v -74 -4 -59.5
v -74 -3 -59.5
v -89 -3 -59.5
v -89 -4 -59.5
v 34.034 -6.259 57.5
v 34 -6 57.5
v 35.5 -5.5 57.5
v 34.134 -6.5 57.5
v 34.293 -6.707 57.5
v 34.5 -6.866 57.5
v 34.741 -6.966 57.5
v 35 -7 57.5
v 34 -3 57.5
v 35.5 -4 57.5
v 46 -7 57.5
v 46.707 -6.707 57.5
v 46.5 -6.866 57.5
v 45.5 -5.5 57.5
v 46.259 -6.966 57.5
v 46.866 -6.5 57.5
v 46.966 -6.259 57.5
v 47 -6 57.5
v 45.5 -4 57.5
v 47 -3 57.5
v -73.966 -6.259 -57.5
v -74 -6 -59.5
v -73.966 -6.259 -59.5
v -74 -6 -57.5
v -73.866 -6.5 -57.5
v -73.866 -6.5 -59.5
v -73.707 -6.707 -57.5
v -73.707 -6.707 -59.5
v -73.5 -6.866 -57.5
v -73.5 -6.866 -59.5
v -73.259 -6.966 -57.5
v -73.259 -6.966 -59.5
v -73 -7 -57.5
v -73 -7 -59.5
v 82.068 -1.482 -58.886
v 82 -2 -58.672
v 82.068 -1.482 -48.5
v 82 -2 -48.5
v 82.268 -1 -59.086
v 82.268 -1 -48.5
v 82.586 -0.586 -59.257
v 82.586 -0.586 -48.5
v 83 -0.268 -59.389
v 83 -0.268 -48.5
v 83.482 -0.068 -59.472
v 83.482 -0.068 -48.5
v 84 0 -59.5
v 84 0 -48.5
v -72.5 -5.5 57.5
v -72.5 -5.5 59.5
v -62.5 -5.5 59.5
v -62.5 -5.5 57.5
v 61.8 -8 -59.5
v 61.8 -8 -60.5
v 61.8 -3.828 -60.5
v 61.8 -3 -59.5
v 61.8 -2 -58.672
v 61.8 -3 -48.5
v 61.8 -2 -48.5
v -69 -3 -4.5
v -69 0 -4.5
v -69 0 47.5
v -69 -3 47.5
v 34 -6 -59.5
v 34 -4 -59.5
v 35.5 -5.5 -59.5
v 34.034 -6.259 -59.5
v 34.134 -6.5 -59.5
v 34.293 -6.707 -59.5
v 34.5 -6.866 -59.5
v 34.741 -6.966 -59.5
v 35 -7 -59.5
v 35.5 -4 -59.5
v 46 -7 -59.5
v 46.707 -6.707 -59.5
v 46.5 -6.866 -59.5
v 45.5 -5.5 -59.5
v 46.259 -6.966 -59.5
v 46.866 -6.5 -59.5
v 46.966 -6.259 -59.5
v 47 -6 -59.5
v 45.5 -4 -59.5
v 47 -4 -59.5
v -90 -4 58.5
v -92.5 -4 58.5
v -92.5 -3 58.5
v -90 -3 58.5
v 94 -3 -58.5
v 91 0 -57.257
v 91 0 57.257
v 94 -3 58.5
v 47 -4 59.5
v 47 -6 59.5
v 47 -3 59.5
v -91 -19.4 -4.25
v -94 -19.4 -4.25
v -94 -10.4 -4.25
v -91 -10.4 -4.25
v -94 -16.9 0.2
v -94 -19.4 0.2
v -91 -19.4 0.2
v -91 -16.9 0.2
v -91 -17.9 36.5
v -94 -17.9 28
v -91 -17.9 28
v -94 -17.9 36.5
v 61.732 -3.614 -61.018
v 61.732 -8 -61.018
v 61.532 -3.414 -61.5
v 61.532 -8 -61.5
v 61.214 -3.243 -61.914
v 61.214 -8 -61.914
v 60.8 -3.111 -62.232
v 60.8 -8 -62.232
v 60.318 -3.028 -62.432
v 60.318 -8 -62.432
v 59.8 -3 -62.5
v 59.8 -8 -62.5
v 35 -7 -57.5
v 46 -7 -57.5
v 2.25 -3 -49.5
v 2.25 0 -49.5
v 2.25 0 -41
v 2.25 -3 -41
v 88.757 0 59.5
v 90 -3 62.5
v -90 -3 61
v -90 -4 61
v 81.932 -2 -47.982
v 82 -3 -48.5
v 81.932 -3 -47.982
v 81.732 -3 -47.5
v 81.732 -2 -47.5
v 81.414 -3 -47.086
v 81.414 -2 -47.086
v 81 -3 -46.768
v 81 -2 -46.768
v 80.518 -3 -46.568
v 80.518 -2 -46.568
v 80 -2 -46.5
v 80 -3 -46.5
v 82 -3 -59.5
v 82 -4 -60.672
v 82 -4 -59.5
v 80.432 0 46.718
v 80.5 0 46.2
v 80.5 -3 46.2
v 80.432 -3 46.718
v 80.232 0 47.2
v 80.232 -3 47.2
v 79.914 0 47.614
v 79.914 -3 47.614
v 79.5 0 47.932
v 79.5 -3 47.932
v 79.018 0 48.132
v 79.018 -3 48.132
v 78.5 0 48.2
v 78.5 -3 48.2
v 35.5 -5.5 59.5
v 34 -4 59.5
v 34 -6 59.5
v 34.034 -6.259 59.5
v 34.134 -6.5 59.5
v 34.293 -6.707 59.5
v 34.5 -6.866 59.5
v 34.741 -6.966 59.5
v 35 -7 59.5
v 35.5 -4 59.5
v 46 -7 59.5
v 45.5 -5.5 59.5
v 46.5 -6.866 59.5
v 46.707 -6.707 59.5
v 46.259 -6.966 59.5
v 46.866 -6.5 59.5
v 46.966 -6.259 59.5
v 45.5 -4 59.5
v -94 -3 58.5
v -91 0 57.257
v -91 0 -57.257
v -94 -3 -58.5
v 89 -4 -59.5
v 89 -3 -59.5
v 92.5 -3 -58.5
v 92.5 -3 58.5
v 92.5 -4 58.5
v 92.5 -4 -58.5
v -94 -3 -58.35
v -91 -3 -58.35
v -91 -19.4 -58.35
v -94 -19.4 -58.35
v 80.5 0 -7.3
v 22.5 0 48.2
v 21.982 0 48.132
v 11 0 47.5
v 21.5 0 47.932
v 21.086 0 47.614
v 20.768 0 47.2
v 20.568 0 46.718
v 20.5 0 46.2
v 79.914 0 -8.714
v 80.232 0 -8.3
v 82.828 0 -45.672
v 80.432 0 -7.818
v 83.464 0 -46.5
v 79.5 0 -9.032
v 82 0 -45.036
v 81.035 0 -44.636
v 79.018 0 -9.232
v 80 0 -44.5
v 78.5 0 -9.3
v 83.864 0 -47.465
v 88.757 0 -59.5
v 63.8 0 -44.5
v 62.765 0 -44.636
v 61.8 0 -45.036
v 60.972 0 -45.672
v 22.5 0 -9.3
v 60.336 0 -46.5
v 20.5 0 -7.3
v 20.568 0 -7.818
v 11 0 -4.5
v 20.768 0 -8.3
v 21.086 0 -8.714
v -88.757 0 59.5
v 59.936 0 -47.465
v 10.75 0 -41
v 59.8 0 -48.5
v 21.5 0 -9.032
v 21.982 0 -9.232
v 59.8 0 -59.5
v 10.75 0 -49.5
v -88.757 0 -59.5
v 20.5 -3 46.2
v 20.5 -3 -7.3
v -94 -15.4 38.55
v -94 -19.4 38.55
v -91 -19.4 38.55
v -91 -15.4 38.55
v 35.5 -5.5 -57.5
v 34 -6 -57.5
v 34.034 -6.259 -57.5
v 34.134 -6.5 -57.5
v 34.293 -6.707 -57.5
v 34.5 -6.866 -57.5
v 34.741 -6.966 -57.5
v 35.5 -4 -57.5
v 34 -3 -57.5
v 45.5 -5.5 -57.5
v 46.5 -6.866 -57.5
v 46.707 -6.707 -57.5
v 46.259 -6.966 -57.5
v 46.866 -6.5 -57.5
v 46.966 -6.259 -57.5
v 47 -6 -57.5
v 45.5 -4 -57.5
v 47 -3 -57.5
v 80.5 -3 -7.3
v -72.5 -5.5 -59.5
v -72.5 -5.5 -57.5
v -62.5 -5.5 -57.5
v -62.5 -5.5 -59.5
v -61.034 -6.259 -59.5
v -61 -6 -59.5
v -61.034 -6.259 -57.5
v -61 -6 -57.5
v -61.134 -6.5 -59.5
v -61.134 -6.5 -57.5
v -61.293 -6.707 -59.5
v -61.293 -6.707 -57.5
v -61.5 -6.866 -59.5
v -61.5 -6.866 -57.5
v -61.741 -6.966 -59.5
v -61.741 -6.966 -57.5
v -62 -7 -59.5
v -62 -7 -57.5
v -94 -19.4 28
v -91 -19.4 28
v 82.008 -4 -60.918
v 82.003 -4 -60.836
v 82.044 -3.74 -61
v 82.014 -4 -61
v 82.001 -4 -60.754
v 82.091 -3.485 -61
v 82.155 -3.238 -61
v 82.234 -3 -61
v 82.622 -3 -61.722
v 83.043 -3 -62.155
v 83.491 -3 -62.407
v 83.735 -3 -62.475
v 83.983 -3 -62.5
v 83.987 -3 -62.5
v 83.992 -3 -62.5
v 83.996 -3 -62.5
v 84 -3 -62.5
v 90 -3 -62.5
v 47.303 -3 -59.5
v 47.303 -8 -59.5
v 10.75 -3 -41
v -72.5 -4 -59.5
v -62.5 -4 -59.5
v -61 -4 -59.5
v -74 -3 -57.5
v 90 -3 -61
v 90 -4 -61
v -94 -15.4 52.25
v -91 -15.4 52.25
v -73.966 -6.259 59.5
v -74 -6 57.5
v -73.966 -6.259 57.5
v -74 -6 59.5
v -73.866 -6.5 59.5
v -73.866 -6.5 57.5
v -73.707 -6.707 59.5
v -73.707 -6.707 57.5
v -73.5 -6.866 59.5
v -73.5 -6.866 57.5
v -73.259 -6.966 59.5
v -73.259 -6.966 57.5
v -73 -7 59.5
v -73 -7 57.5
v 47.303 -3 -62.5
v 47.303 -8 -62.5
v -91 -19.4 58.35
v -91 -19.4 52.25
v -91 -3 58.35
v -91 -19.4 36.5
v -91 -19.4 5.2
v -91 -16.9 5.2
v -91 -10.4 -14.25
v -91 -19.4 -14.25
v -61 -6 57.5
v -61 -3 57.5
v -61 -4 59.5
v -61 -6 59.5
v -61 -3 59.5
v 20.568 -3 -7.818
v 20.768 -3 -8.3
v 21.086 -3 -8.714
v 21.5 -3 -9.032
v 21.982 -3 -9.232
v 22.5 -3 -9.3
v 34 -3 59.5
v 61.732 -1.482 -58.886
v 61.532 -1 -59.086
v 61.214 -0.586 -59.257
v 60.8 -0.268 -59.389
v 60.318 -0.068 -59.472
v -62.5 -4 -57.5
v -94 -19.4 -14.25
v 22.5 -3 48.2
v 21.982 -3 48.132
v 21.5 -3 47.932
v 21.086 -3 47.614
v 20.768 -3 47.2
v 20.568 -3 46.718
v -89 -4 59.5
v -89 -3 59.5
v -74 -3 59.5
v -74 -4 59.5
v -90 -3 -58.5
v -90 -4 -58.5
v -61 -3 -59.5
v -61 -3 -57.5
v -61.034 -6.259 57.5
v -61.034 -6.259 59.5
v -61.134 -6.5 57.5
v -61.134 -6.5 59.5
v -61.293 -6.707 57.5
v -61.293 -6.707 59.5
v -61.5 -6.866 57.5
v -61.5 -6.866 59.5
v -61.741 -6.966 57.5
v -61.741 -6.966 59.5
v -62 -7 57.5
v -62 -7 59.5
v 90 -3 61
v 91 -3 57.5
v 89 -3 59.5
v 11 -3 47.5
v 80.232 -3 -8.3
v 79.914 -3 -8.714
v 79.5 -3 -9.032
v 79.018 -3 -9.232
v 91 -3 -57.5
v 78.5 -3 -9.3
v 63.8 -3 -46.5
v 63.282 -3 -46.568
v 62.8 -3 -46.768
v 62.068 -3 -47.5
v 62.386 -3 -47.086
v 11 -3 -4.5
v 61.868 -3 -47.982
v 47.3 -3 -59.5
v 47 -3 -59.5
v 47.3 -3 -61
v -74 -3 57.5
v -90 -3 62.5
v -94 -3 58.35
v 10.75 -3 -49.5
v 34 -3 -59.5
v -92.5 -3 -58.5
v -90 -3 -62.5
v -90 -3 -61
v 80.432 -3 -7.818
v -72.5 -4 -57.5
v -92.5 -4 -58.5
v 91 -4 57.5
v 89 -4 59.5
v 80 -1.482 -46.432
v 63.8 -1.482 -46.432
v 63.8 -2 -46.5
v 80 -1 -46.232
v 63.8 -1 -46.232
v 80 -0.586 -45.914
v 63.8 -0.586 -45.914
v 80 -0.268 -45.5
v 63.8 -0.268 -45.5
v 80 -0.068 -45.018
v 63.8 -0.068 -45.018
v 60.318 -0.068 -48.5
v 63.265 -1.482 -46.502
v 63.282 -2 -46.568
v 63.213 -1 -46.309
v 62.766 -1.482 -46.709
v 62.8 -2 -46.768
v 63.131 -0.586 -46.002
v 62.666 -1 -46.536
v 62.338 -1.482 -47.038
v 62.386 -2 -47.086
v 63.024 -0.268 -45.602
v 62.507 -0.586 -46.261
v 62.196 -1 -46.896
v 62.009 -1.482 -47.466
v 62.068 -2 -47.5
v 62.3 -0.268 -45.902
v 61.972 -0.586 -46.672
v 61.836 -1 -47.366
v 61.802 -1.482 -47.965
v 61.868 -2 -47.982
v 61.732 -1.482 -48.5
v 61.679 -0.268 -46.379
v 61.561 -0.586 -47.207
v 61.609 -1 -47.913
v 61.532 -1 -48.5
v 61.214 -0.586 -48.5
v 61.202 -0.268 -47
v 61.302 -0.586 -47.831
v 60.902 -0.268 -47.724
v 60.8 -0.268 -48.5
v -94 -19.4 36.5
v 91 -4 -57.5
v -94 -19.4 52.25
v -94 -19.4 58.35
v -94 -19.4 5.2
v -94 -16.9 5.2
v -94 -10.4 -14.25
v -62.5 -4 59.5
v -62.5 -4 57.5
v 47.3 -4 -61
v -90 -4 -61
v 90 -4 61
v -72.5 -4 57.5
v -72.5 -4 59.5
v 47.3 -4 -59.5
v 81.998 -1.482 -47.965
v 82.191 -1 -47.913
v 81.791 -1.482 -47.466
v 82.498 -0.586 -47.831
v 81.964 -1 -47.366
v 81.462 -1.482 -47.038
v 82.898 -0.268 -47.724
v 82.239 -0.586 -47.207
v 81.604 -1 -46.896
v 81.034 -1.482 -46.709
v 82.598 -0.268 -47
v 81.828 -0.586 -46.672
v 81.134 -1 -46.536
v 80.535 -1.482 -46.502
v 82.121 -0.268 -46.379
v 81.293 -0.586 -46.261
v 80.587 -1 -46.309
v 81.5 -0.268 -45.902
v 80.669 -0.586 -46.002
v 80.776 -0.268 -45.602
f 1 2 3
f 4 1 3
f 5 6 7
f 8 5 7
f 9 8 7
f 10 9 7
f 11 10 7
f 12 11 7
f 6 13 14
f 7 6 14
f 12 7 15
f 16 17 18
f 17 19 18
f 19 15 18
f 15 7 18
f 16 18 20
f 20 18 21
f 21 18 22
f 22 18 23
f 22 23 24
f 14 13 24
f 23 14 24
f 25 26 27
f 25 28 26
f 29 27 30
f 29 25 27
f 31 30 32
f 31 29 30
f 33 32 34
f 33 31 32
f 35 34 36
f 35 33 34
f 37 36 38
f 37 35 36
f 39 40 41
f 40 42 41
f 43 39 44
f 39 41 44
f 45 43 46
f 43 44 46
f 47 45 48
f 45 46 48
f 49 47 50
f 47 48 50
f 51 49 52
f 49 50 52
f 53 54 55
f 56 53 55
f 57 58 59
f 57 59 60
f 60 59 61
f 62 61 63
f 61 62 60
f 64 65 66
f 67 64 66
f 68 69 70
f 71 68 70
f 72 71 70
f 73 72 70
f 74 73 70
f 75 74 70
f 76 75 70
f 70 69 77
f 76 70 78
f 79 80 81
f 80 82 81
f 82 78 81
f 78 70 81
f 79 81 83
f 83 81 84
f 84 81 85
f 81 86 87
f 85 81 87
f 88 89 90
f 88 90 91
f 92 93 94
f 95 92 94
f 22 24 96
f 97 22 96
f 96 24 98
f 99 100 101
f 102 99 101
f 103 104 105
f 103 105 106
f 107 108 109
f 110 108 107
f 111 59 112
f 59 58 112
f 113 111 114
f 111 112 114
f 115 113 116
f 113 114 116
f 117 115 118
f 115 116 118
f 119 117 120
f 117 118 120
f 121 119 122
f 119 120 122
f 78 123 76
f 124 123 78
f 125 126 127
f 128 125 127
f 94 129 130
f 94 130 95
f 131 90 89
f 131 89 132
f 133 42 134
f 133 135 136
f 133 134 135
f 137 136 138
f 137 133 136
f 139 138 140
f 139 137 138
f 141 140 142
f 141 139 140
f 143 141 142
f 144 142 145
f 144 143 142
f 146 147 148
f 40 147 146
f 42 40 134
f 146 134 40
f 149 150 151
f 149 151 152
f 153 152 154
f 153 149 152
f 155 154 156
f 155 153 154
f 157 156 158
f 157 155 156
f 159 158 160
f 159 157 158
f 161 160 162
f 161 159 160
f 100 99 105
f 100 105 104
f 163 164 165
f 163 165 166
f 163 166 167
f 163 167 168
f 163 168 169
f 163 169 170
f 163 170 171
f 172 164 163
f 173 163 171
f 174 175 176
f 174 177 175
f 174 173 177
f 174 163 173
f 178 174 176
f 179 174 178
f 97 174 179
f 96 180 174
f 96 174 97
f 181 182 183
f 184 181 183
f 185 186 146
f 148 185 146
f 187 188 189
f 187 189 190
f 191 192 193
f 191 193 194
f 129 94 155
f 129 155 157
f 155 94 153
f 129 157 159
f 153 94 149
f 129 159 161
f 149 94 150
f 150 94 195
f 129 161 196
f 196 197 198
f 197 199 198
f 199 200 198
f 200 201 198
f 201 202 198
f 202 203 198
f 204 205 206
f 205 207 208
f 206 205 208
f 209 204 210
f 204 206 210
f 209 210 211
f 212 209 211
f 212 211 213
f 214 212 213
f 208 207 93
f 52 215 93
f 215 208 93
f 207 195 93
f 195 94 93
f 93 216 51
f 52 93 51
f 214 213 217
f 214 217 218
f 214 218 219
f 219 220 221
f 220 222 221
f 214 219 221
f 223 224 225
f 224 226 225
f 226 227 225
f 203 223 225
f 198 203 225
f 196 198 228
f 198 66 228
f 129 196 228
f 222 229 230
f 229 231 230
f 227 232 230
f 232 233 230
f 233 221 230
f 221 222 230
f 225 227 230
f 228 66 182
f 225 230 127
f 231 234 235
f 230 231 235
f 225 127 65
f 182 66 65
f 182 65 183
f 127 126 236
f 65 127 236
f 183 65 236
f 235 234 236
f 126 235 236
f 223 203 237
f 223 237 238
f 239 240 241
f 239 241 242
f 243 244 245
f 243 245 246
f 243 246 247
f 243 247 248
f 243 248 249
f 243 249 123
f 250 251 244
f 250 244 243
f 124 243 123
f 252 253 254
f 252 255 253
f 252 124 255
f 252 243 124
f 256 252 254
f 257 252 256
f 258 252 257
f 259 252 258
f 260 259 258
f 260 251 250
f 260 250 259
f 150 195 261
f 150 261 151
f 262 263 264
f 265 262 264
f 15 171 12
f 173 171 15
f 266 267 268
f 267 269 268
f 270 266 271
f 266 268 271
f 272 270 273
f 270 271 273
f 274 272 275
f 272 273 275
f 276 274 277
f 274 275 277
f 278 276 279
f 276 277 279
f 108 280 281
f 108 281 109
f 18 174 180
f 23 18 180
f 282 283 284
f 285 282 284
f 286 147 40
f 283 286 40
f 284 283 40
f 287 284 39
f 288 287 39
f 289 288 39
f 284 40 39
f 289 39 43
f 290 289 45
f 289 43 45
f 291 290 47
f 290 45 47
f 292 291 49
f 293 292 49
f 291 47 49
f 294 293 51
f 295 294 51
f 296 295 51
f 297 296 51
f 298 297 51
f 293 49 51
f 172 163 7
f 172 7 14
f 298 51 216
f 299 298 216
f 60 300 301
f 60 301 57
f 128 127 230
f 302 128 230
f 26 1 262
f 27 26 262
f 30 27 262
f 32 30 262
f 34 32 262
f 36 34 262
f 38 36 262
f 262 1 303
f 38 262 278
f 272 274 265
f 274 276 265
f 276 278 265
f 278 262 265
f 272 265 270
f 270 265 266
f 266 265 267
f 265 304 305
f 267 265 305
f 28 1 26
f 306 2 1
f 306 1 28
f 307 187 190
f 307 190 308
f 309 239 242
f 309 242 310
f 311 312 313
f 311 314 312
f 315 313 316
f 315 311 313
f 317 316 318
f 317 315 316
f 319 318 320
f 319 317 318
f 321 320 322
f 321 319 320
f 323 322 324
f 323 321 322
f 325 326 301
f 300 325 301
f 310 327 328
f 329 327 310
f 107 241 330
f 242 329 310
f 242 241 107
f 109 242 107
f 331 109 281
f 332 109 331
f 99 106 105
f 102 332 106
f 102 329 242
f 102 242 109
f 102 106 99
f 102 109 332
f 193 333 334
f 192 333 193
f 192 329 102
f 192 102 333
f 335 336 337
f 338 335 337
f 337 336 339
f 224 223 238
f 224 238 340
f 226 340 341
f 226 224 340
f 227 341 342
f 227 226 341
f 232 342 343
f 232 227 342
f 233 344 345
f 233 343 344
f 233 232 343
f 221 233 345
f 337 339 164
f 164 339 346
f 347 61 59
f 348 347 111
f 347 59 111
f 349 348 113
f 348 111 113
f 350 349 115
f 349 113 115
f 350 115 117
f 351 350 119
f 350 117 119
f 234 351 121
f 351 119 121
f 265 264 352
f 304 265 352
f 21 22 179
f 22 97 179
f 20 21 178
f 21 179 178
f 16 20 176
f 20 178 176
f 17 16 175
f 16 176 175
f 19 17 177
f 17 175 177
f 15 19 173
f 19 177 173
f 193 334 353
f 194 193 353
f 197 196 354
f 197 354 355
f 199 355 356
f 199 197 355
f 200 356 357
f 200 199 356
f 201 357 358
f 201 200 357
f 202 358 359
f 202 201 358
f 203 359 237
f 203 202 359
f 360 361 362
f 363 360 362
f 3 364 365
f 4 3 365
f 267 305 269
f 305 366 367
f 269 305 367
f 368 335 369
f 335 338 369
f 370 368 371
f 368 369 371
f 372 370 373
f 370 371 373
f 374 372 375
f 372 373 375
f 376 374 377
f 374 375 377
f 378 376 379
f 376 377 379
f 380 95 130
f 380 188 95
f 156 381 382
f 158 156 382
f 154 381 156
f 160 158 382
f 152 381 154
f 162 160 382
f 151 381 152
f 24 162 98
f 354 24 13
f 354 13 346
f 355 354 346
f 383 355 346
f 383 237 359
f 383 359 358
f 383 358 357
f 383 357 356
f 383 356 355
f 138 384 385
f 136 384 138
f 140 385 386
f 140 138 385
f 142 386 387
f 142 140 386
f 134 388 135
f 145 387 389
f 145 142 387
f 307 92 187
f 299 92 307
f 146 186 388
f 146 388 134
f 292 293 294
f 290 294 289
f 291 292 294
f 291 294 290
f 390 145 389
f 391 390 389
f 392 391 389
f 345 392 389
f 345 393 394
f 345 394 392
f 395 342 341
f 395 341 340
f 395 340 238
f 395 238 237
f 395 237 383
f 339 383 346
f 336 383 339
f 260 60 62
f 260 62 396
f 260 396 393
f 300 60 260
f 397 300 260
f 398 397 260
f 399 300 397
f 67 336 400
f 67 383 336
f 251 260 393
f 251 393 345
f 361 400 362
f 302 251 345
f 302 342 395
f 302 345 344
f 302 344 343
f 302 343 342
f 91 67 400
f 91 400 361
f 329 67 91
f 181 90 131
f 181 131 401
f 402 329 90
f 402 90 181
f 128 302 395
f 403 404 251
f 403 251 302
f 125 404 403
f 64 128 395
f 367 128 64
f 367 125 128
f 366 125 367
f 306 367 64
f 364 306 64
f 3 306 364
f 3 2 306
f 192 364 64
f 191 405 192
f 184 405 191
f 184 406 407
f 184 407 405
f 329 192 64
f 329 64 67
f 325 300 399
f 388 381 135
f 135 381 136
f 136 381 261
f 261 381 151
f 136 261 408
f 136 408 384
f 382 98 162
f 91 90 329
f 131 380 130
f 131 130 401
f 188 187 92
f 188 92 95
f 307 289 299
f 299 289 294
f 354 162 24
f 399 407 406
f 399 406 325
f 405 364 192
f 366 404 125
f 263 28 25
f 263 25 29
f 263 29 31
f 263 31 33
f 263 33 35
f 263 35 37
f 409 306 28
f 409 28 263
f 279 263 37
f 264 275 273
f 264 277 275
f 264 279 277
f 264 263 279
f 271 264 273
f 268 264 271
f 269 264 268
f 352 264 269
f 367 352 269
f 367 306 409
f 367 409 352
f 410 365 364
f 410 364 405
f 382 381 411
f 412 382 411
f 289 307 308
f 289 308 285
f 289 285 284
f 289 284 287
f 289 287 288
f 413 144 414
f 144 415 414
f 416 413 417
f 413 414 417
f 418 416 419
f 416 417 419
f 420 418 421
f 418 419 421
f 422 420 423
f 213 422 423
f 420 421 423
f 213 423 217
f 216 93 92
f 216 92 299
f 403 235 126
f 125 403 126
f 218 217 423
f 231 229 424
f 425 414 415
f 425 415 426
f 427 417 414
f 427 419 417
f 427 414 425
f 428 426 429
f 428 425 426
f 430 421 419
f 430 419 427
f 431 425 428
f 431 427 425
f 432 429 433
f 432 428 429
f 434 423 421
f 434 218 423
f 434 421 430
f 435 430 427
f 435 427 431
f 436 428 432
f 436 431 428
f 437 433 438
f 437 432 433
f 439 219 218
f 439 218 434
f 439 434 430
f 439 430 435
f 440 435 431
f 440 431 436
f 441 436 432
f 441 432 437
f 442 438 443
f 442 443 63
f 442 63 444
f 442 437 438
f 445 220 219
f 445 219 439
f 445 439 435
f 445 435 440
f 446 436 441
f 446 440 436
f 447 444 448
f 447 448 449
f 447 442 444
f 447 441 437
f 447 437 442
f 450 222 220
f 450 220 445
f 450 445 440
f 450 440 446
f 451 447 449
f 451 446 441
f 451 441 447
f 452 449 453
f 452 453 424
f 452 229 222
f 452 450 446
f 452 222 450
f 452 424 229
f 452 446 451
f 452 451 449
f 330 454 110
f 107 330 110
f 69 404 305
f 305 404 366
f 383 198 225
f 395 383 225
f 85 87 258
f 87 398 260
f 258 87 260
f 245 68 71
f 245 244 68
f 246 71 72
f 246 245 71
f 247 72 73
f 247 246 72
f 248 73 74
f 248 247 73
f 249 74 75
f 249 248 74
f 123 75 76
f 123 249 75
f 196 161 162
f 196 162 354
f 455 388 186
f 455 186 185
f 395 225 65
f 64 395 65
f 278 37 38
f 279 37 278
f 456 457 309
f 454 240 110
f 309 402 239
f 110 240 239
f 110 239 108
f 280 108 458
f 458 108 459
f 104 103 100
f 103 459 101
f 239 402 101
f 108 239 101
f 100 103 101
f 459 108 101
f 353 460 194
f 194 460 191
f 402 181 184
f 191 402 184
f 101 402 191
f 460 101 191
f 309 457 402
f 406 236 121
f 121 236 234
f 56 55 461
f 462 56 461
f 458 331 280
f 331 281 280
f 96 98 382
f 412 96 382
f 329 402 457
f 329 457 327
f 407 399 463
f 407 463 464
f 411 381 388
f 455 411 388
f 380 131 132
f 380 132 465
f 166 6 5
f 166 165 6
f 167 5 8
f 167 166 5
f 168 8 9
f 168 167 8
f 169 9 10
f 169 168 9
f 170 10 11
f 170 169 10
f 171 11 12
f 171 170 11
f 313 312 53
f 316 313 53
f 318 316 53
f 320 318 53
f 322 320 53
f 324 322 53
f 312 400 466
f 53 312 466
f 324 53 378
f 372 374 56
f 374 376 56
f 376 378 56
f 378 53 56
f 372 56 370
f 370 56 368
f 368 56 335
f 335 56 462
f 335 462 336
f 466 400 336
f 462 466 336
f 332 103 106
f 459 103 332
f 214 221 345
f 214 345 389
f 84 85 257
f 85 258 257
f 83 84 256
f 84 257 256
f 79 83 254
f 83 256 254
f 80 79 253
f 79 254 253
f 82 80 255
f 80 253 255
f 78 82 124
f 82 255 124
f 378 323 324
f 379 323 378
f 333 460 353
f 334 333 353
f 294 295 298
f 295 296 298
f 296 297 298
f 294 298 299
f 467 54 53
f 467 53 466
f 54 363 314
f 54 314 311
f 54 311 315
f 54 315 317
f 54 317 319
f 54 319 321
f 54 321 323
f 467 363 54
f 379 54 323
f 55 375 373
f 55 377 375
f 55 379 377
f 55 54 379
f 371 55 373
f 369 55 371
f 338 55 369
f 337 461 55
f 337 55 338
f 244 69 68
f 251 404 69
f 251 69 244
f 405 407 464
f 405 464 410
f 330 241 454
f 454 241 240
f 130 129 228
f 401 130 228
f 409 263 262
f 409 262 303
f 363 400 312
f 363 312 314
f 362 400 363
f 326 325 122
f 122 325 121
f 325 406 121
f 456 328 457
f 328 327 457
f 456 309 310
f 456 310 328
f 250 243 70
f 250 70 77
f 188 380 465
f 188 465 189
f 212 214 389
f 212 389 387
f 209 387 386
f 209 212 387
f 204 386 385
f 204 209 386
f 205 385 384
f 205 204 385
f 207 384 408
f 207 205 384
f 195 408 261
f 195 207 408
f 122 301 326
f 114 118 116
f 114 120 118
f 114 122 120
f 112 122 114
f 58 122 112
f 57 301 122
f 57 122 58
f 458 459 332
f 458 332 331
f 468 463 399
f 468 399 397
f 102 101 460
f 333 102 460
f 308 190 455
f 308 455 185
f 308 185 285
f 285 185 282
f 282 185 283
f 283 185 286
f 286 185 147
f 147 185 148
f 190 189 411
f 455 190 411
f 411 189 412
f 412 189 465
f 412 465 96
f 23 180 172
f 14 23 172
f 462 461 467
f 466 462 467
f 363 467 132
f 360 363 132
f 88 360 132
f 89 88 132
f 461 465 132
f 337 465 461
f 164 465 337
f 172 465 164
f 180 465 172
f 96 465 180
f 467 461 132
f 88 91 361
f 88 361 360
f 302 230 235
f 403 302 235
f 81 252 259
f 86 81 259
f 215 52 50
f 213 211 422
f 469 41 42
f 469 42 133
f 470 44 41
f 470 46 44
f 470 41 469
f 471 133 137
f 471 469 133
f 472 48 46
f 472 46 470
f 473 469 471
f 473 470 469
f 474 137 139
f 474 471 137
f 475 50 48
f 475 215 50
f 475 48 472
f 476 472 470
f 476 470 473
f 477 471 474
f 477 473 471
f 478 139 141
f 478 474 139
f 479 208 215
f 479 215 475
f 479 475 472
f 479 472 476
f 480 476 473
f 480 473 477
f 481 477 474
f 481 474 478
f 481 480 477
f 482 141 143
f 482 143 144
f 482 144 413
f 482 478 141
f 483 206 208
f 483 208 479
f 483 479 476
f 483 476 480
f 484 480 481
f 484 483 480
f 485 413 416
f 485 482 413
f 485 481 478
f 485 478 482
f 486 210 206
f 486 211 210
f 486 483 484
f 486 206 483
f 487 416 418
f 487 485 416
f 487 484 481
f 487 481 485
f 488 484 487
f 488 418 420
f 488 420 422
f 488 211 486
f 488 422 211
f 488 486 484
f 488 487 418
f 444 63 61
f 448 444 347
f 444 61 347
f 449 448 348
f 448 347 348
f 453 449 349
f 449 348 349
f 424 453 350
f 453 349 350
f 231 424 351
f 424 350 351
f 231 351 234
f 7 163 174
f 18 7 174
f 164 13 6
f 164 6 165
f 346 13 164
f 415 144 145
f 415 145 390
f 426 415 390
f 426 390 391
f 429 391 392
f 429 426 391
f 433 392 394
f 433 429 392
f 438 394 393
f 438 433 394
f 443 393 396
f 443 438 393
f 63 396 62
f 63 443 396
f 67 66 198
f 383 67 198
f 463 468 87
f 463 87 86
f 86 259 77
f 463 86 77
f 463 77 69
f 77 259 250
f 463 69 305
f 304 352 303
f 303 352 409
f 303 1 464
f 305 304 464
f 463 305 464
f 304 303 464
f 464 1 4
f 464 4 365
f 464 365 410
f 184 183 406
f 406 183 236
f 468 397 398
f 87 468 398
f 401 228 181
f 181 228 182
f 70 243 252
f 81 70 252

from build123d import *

# Parameters (mm, degrees)
EXTRUDE_1_DEPTH     = 3
SKETCH_2_W          = 13.000000000000007
SKETCH_2_H          = 2.000000000000014
SKETCH_2_W_2        = 12.999999999999993
EXTRUDE_2_DEPTH     = 4
CUT_EXTRUDE_1_REACH = 156.172
SKETCH_3_W          = 10.000000000000021
SKETCH_3_H          = 1.5
SKETCH_3_W_2        = 10
FILLET_1_R          = 1
CHAMFER_1_SIZE      = 4
CHAMFER_2_SIZE      = 3
EXTRUDE_3_DEPTH     = 1
CHAMFER_3_SIZE      = 2
CUT_EXTRUDE_2_REACH = 115.098
CUT_EXTRUDE_3_DEPTH = 1
EXTRUDE_4_DEPTH     = 16.4
CUT_EXTRUDE_4_REACH = 201.064
SKETCH_9_W          = 8.500000000000004
SKETCH_9_H          = 1.5000000000000036
SKETCH_10_W         = 14.5
SKETCH_10_H         = 1.5000000000000284
CUT_EXTRUDE_5_DEPTH = 1
SKETCH_11_W         = 14.496613720637008
SKETCH_11_H         = 3.000000000000007
EXTRUDE_5_DEPTH     = 5
FILLET_2_R          = 2


with BuildPart() as part:
    # 草图1 → 凸台-拉伸1 (new body)
    with BuildSketch(Plane(origin=(0, 0, 0), x_dir=(1, 0, 0), z_dir=(0, 1, 0))):
        Polygon((93.99999999999997, -62.499999999999964), (-94.00000000000001, -62.5), (-94.00000000000003, 62.500000000000014), (93.99999999999997, 62.50000000000004), align=None)
    extrude(amount=-EXTRUDE_1_DEPTH)

    # 草图2 → 凸台-拉伸2 (add)
    with BuildSketch(Plane.XZ.offset(3)):
        with Locations((-67.50000000000003, 58.5)):
            Rectangle(SKETCH_2_W, SKETCH_2_H)
        with Locations((40.49999999999994, 58.5)):
            Rectangle(SKETCH_2_W_2, SKETCH_2_H)
        with Locations((40.49999999999994, -58.5)):
            Rectangle(SKETCH_2_W_2, SKETCH_2_H)
        with Locations((-67.50000000000003, -58.5)):
            Rectangle(SKETCH_2_W, SKETCH_2_H)
    extrude(amount=EXTRUDE_2_DEPTH)

    # 切除-拉伸1: up to this face of the body (flat: up to its plane)
    cut_extrude_1_end = Plane(part.part.faces().sort_by_distance((40.5, -5, -59.5))[0])
    # 草图3 → 切除-拉伸1 (cut, up to the picked face)
    with BuildSketch(Plane.XY.offset(59.500000000000036), mode=Mode.PRIVATE) as cut_extrude_1_sk1:
        with Locations((-67.5, -4.75)):
            Rectangle(SKETCH_3_W, SKETCH_3_H)
    cut_extrude_1_tool1 = split(extrude(cut_extrude_1_sk1.sketch, amount=-CUT_EXTRUDE_1_REACH, mode=Mode.PRIVATE), bisect_by=cut_extrude_1_end, keep=Keep.BOTH, mode=Mode.PRIVATE)
    # 草图3 → 切除-拉伸1 (cut, up to the picked face)
    with BuildSketch(Plane.XY.offset(59.500000000000036), mode=Mode.PRIVATE) as cut_extrude_1_sk2:
        with Locations((40.499999999999986, -4.75)):
            Rectangle(SKETCH_3_W_2, SKETCH_3_H)
    cut_extrude_1_tool2 = split(extrude(cut_extrude_1_sk2.sketch, amount=-CUT_EXTRUDE_1_REACH, mode=Mode.PRIVATE), bisect_by=cut_extrude_1_end, keep=Keep.BOTH, mode=Mode.PRIVATE)
    add(cut_extrude_1_tool1.solids().sort_by(Axis((-67.5, -4.75, 59.5), (0, 0, -1)))[0], mode=Mode.SUBTRACT)
    add(cut_extrude_1_tool2.solids().sort_by(Axis((40.5, -4.75, 59.5), (0, 0, -1)))[0], mode=Mode.SUBTRACT)

    # 圆角1
    fillet_1_edges = [part.edges().sort_by_distance(p)[0] for p in [
        (-74.00000000000003, -7, 58.5),
        (-61.00000000000003, -7, 58.5),
        (33.99999999999995, -7, 58.5),
        (46.99999999999994, -7, 58.5),
        (33.99999999999995, -7, -58.5),
        (46.99999999999994, -7, -58.5),
        (-74.00000000000003, -7, -58.5),
        (-61.00000000000003, -7, -58.5),
    ]]
    fillet(fillet_1_edges, radius=FILLET_1_R)

    # 倒角1
    chamfer_1_edges = [part.edges().sort_by_distance(p)[0] for p in [
        (-94.00000000000003, -1.5, -62.500000000000014),
        (93.99999999999997, -1.5, -62.50000000000004),
        (93.99999999999997, -1.5, 62.499999999999964),
        (-94.00000000000001, -1.5, 62.5),
    ]]
    chamfer(chamfer_1_edges, length=CHAMFER_1_SIZE)

    # 倒角2
    chamfer_2_edges = [part.edges().sort_by_distance(p)[0] for p in [
        (91.99999999999997, 0, -60.50000000000005),
        (-2.842e-14, 0, -62.50000000000003),
        (-92.00000000000004, 0, -60.50000000000002),
        (-94.00000000000001, 0, -7.11e-15),
        (-92.00000000000003, 0, 60.5),
        (-2.842e-14, 0, 62.499999999999986),
        (91.99999999999999, 0, 60.499999999999964),
        (93.99999999999997, 0, -4.974e-14),
    ]]
    chamfer(chamfer_2_edges, length=CHAMFER_2_SIZE - 0.0001)  # a hair under: the kernel refuses the full size

    # 草图4 → 凸台-拉伸3 (add)
    with BuildSketch(Plane.XZ.offset(3)):
        Polygon((-89.99999999999997, -61.00000000000003), (-92.49999999999997, -58.50000000000002), (-92.49999999999999, 58.499999999999964), (-89.99999999999999, 60.999999999999964), (90.00000000000001, 60.99999999999999), (92.50000000000001, 58.49999999999999), (92.50000000000003, -58.5), (90.00000000000003, -61.00000000000001), align=None)
        Polygon((91, -59.49999999999999), (-91, -59.500000000000014), (-91, 59.49999999999998), (91, 59.50000000000001), align=None, mode=Mode.SUBTRACT)
    extrude(amount=EXTRUDE_3_DEPTH)

    # 倒角3
    chamfer_3_edges = [part.edges().sort_by_distance(p)[0] for p in [
        (91, -3.5, -59.49999999999999),
        (-91, -3.5, 59.49999999999998),
        (-91, -3.5, -59.500000000000014),
        (91, -3.5, 59.50000000000001),
    ]]
    chamfer(chamfer_3_edges, length=CHAMFER_3_SIZE)

    # 草图5 → 切除-拉伸2 (cut, up to next)
    with BuildSketch(Plane(origin=(0, 0, 0), x_dir=(1, 0, 0), z_dir=(0, 1, 0)), mode=Mode.PRIVATE) as cut_extrude_2_sk1:
        Polygon((-68.99999999999999, -47.49999999999995), (11.00000000000001, -47.49999999999995), (11.00000000000001, 4.500000000000045), (-68.99999999999999, 4.500000000000047), align=None)
    cut_extrude_2_tool1 = extrude(cut_extrude_2_sk1.sketch, amount=-CUT_EXTRUDE_2_REACH, mode=Mode.PRIVATE) & part.part
    # 草图5 → 切除-拉伸2 (cut, up to next)
    with BuildSketch(Plane(origin=(0, 0, 0), x_dir=(1, 0, 0), z_dir=(0, 1, 0)), mode=Mode.PRIVATE) as cut_extrude_2_sk2:
        Polygon((2.249999999999944, 40.99999999999997), (10.749999999999943, 40.99999999999997), (10.749999999999941, 49.49999999999997), (2.2499999999999423, 49.499999999999964), align=None)
    cut_extrude_2_tool2 = extrude(cut_extrude_2_sk2.sketch, amount=-CUT_EXTRUDE_2_REACH, mode=Mode.PRIVATE) & part.part
    # 草图5 → 切除-拉伸2 (cut, up to next)
    with BuildSketch(Plane(origin=(0, 0, 0), x_dir=(1, 0, 0), z_dir=(0, 1, 0)), mode=Mode.PRIVATE) as cut_extrude_2_sk3:
        with BuildLine():
            Line((61.79999999999998, 62.50000000000004), (81.99999999999997, 62.50000000000004))
            Line((81.99999999999997, 62.50000000000004), (81.99999999999997, 48.50000000000004))
            ThreePointArc((81.99999999999997, 48.50000000000004), (81.41421356237306, 47.08578643762695), (79.99999999999997, 46.50000000000004))
            Line((79.99999999999997, 46.50000000000004), (63.79999999999998, 46.50000000000004))
            ThreePointArc((63.79999999999998, 46.50000000000004), (62.38578643762689, 47.08578643762695), (61.79999999999998, 48.50000000000004))
            Line((61.79999999999998, 48.50000000000004), (61.79999999999998, 62.50000000000004))
        make_face()
    cut_extrude_2_tool3 = extrude(cut_extrude_2_sk3.sketch, amount=-CUT_EXTRUDE_2_REACH, mode=Mode.PRIVATE) & part.part
    # 草图5 → 切除-拉伸2 (cut, up to next)
    with BuildSketch(Plane(origin=(0, 0, 0), x_dir=(1, 0, 0), z_dir=(0, 1, 0)), mode=Mode.PRIVATE) as cut_extrude_2_sk4:
        with BuildLine():
            Line((22.500000000000018, 9.300000000000042), (78.49999999999999, 9.300000000000042))
            ThreePointArc((78.49999999999999, 9.300000000000042), (79.91421356237309, 8.714213562373137), (80.5, 7.300000000000027))
            Line((80.5, 7.300000000000027), (80.50000000000001, -46.199999999999946))
            ThreePointArc((80.50000000000001, -46.199999999999946), (79.9142135623731, -47.61421356237305), (78.5, -48.19999999999996))
            Line((78.5, -48.19999999999996), (22.500000000000025, -48.19999999999996))
            ThreePointArc((22.500000000000025, -48.19999999999996), (21.085786437626915, -47.61421356237305), (20.500000000000007, -46.199999999999946))
            Line((20.500000000000007, -46.199999999999946), (20.5, 7.300000000000027))
            ThreePointArc((20.5, 7.300000000000027), (21.085786437626904, 8.714213562373137), (22.500000000000018, 9.300000000000042))
        make_face()
    cut_extrude_2_tool4 = extrude(cut_extrude_2_sk4.sketch, amount=-CUT_EXTRUDE_2_REACH, mode=Mode.PRIVATE) & part.part
    add(cut_extrude_2_tool1.solids().sort_by_distance((-29, 0, 21.5))[0], mode=Mode.SUBTRACT)
    add(cut_extrude_2_tool2.solids().sort_by_distance((6.5, 0, -45.25))[0], mode=Mode.SUBTRACT)
    add(cut_extrude_2_tool3.solids().sort_by_distance((71.9, 0, -54.540337))[0], mode=Mode.SUBTRACT)
    add(cut_extrude_2_tool4.solids().sort_by_distance((50.5, 0, 19.45))[0], mode=Mode.SUBTRACT)

    # 草图7 → 切除-拉伸3 (cut)
    with BuildSketch(Plane.XZ.offset(4)):
        Polygon((-92.49999999999999, 58.499999999999964), (-89.99999999999994, 58.499999999999964), (-91, 57.49999999999998), (-91, -57.49999999999998), (-89.99999999999996, -58.50000000000002), (-92.49999999999997, -58.50000000000002), align=None)
    extrude(amount=-CUT_EXTRUDE_3_DEPTH, mode=Mode.SUBTRACT)

    # 草图8 → 凸台-拉伸4 (add)
    with BuildSketch(Plane.XZ.offset(3)):
        Polygon((-94.00000000000003, 58.349999999999966), (-91.00000000000003, 58.349999999999966), (-91.00000000000001, -58.35000000000003), (-94.00000000000001, -58.35000000000003), align=None)
    extrude(amount=EXTRUDE_4_DEPTH)

    # 草图9 → 切除-拉伸4 (cut, up to next)
    with BuildSketch(Plane.ZY.offset(94.00000000000003), mode=Mode.PRIVATE) as cut_extrude_4_sk1:
        Polygon((-14.25000000000002, -19.4), (-4.250000000000012, -19.4), (-4.250000000000012, -10.399999999999999), (-14.250000000000012, -10.399999999999999), align=None)
    cut_extrude_4_tool1 = extrude(cut_extrude_4_sk1.sketch, amount=-CUT_EXTRUDE_4_REACH, mode=Mode.PRIVATE) & part.part
    # 草图9 → 切除-拉伸4 (cut, up to next)
    with BuildSketch(Plane.ZY.offset(94.00000000000003), mode=Mode.PRIVATE) as cut_extrude_4_sk2:
        Polygon((52.24999999999998, -19.4), (38.54999999999998, -19.4), (38.54999999999998, -15.399999999999999), (52.24999999999998, -15.399999999999997), align=None)
    cut_extrude_4_tool2 = extrude(cut_extrude_4_sk2.sketch, amount=-CUT_EXTRUDE_4_REACH, mode=Mode.PRIVATE) & part.part
    # 草图9 → 切除-拉伸4 (cut, up to next)
    with BuildSketch(Plane.ZY.offset(94.00000000000003), mode=Mode.PRIVATE) as cut_extrude_4_sk3:
        Polygon((0.19999999999998752, -19.4), (0.19999999999998752, -16.9), (5.199999999999988, -16.9), (5.1999999999999895, -19.4), align=None)
    cut_extrude_4_tool3 = extrude(cut_extrude_4_sk3.sketch, amount=-CUT_EXTRUDE_4_REACH, mode=Mode.PRIVATE) & part.part
    # 草图9 → 切除-拉伸4 (cut, up to next)
    with BuildSketch(Plane.ZY.offset(94.00000000000003), mode=Mode.PRIVATE) as cut_extrude_4_sk4:
        with Locations((32.24999999999998, -18.65)):
            Rectangle(SKETCH_9_W, SKETCH_9_H)
    cut_extrude_4_tool4 = extrude(cut_extrude_4_sk4.sketch, amount=-CUT_EXTRUDE_4_REACH, mode=Mode.PRIVATE) & part.part
    add(cut_extrude_4_tool1.solids().sort_by_distance((-94, -14.9, -9.25))[0], mode=Mode.SUBTRACT)
    add(cut_extrude_4_tool2.solids().sort_by_distance((-94, -17.4, 45.4))[0], mode=Mode.SUBTRACT)
    add(cut_extrude_4_tool3.solids().sort_by_distance((-94, -18.15, 2.7))[0], mode=Mode.SUBTRACT)
    add(cut_extrude_4_tool4.solids().sort_by_distance((-94, -18.65, 32.25))[0], mode=Mode.SUBTRACT)

    # 草图10 → 切除-拉伸5 (cut)
    with BuildSketch(Plane.XZ.offset(4)):
        with Locations((54.54999999999998, -60.25000000000001)):
            Rectangle(SKETCH_10_W, SKETCH_10_H)
    extrude(amount=-CUT_EXTRUDE_5_DEPTH, mode=Mode.SUBTRACT)

    # 草图11 → 凸台-拉伸5 (add)
    with BuildSketch(Plane.XZ.offset(3)):
        with Locations((54.551693139681475, -61.00000000000004)):
            Rectangle(SKETCH_11_W, SKETCH_11_H)
    extrude(amount=EXTRUDE_5_DEPTH)

    # 圆角2
    fillet_2_edges = [part.edges().sort_by_distance(p)[0] for p in [
        (81.99999999999997, 0, -54.000050000000044),
        (81.41421356237306, 0, -47.08578643762695),
        (71.89999999999998, 0, -46.50000000000004),
        (62.38578643762689, 0, -47.08578643762695),
        (81.99999999999997, -1.499950000000006, -61.00005000000004),
        (61.79999999999998, -5.49995, -62.50000000000004),
        (61.79999999999998, -1.4999500000000077, -61.00005000000003),
        (61.79999999999998, 0, -54.000050000000044),
    ]]
    fillet(fillet_2_edges, radius=FILLET_2_R)


solid = part.part
